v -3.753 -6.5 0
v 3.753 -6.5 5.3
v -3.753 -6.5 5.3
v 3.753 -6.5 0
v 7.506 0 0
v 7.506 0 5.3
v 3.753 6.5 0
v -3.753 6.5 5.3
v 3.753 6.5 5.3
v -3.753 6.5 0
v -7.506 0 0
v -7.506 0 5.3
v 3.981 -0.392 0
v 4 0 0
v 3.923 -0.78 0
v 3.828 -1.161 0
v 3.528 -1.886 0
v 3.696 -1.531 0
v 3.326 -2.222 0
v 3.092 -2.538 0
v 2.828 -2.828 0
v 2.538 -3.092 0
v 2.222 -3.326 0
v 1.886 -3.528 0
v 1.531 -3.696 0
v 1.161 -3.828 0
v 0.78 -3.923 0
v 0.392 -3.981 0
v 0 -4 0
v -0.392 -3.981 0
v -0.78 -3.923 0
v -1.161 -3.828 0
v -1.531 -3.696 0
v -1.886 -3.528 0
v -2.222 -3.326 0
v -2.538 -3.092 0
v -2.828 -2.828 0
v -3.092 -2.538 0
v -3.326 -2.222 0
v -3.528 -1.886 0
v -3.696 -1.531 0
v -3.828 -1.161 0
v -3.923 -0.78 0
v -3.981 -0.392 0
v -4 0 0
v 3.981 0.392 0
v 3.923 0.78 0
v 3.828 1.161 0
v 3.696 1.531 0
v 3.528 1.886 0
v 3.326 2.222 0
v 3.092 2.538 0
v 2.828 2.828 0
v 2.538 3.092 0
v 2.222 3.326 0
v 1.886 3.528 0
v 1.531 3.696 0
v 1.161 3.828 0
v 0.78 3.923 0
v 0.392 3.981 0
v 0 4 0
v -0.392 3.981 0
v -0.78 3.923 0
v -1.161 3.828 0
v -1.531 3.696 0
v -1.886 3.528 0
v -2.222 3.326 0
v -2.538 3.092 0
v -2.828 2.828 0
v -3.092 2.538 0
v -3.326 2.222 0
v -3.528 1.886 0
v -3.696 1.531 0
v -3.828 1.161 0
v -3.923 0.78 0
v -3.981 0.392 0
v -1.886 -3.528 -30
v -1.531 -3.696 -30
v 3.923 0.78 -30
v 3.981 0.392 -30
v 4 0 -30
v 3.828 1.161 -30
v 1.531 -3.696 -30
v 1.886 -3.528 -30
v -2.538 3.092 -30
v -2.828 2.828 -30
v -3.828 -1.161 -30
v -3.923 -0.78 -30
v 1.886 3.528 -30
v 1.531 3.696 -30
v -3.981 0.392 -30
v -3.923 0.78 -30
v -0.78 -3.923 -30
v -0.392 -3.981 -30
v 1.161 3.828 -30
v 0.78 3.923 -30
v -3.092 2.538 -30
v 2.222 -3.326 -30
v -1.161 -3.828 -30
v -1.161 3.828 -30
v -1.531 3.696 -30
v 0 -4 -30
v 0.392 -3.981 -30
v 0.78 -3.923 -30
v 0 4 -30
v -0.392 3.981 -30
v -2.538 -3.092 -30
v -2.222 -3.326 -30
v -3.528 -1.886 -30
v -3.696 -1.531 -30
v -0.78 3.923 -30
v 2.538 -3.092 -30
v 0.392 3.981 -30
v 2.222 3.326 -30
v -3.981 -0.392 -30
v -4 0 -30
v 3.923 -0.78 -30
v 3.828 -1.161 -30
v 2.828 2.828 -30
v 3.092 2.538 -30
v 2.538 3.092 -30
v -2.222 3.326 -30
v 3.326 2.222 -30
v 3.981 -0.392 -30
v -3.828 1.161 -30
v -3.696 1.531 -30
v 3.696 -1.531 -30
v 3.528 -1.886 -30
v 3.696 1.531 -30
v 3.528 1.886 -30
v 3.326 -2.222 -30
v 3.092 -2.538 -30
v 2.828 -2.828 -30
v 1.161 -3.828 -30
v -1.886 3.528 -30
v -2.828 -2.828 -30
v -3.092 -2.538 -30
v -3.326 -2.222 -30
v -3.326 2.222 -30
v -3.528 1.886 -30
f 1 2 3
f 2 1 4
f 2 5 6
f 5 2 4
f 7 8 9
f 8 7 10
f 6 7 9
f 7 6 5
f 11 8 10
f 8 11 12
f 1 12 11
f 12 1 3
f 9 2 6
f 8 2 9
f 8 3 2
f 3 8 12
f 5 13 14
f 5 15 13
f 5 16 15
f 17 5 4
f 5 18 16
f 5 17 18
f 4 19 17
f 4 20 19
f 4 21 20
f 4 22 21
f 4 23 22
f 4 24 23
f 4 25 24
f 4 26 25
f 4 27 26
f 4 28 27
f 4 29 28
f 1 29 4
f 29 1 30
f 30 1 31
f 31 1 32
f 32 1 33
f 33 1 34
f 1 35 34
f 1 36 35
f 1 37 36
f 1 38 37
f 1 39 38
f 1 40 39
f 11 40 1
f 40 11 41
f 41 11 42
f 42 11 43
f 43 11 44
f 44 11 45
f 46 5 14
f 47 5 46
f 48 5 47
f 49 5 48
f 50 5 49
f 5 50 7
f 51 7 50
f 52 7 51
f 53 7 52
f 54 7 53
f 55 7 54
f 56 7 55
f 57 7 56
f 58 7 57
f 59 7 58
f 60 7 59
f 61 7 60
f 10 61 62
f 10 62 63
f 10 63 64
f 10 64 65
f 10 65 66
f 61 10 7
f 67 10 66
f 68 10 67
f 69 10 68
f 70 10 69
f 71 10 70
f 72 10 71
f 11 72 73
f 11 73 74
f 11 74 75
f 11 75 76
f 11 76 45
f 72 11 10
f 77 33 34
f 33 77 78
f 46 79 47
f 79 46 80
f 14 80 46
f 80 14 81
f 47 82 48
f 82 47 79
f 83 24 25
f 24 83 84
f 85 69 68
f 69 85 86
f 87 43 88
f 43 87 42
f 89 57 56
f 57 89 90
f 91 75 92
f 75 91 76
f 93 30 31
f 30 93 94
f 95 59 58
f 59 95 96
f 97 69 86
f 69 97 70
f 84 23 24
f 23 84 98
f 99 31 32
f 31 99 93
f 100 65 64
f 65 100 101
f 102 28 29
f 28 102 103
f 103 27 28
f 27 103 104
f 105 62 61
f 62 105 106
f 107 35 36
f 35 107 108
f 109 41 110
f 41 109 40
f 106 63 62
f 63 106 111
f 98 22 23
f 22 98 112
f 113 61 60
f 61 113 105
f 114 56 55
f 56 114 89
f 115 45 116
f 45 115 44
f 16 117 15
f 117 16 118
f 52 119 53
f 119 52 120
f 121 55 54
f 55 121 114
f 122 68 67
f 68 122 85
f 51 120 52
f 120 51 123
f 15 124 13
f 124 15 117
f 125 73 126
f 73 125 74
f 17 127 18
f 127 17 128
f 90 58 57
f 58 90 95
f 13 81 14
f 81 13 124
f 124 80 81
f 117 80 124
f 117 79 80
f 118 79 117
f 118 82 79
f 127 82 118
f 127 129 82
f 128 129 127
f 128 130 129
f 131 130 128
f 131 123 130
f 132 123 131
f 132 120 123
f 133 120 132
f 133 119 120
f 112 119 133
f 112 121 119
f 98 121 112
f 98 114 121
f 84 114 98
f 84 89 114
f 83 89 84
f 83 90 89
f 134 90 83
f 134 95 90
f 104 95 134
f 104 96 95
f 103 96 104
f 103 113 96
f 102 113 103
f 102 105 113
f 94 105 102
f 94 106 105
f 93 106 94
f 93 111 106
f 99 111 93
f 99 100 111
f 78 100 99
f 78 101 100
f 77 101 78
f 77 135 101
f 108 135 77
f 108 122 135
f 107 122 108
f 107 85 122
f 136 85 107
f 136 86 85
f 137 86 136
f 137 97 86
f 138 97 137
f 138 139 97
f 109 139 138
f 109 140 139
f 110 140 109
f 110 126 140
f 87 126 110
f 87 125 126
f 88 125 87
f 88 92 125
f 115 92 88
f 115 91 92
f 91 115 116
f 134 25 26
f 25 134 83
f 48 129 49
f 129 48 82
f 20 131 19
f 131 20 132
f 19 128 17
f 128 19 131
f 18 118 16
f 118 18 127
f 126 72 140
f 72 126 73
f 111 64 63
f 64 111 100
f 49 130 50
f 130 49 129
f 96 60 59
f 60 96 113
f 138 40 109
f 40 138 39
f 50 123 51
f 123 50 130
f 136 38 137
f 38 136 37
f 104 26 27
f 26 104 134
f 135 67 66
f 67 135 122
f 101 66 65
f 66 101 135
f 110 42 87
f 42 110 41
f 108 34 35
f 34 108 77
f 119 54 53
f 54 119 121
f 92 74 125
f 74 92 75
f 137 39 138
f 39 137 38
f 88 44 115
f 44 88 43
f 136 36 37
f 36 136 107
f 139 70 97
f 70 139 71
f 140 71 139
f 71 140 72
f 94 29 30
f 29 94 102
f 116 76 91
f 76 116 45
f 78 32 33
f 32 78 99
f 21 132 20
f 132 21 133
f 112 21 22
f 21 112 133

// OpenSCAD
// M8 Hex Bolt (thread omitted, cylindrical shank)
// Head bottom face at z=0, shank extends in -Z direction

// Parameters
across_flats = 13;    // Head across-flats (mm)
head_height  = 5.3;   // Head height (mm)
shank_dia    = 8;     // Shank diameter (mm)
shank_len    = 30;    // Shank length (mm)

// Derived
circumradius = (across_flats / 2) / cos(30);  // across-flats to circumradius

// Hex head: bottom at z=0, top at z=head_height
translate([0, 0, 0])
cylinder(h = head_height, r = circumradius, $fn = 6);

// Shank: extends from z=0 down to z=-shank_len
translate([0, 0, -shank_len])
cylinder(h = shank_len, d = shank_dia, $fn = 64);
